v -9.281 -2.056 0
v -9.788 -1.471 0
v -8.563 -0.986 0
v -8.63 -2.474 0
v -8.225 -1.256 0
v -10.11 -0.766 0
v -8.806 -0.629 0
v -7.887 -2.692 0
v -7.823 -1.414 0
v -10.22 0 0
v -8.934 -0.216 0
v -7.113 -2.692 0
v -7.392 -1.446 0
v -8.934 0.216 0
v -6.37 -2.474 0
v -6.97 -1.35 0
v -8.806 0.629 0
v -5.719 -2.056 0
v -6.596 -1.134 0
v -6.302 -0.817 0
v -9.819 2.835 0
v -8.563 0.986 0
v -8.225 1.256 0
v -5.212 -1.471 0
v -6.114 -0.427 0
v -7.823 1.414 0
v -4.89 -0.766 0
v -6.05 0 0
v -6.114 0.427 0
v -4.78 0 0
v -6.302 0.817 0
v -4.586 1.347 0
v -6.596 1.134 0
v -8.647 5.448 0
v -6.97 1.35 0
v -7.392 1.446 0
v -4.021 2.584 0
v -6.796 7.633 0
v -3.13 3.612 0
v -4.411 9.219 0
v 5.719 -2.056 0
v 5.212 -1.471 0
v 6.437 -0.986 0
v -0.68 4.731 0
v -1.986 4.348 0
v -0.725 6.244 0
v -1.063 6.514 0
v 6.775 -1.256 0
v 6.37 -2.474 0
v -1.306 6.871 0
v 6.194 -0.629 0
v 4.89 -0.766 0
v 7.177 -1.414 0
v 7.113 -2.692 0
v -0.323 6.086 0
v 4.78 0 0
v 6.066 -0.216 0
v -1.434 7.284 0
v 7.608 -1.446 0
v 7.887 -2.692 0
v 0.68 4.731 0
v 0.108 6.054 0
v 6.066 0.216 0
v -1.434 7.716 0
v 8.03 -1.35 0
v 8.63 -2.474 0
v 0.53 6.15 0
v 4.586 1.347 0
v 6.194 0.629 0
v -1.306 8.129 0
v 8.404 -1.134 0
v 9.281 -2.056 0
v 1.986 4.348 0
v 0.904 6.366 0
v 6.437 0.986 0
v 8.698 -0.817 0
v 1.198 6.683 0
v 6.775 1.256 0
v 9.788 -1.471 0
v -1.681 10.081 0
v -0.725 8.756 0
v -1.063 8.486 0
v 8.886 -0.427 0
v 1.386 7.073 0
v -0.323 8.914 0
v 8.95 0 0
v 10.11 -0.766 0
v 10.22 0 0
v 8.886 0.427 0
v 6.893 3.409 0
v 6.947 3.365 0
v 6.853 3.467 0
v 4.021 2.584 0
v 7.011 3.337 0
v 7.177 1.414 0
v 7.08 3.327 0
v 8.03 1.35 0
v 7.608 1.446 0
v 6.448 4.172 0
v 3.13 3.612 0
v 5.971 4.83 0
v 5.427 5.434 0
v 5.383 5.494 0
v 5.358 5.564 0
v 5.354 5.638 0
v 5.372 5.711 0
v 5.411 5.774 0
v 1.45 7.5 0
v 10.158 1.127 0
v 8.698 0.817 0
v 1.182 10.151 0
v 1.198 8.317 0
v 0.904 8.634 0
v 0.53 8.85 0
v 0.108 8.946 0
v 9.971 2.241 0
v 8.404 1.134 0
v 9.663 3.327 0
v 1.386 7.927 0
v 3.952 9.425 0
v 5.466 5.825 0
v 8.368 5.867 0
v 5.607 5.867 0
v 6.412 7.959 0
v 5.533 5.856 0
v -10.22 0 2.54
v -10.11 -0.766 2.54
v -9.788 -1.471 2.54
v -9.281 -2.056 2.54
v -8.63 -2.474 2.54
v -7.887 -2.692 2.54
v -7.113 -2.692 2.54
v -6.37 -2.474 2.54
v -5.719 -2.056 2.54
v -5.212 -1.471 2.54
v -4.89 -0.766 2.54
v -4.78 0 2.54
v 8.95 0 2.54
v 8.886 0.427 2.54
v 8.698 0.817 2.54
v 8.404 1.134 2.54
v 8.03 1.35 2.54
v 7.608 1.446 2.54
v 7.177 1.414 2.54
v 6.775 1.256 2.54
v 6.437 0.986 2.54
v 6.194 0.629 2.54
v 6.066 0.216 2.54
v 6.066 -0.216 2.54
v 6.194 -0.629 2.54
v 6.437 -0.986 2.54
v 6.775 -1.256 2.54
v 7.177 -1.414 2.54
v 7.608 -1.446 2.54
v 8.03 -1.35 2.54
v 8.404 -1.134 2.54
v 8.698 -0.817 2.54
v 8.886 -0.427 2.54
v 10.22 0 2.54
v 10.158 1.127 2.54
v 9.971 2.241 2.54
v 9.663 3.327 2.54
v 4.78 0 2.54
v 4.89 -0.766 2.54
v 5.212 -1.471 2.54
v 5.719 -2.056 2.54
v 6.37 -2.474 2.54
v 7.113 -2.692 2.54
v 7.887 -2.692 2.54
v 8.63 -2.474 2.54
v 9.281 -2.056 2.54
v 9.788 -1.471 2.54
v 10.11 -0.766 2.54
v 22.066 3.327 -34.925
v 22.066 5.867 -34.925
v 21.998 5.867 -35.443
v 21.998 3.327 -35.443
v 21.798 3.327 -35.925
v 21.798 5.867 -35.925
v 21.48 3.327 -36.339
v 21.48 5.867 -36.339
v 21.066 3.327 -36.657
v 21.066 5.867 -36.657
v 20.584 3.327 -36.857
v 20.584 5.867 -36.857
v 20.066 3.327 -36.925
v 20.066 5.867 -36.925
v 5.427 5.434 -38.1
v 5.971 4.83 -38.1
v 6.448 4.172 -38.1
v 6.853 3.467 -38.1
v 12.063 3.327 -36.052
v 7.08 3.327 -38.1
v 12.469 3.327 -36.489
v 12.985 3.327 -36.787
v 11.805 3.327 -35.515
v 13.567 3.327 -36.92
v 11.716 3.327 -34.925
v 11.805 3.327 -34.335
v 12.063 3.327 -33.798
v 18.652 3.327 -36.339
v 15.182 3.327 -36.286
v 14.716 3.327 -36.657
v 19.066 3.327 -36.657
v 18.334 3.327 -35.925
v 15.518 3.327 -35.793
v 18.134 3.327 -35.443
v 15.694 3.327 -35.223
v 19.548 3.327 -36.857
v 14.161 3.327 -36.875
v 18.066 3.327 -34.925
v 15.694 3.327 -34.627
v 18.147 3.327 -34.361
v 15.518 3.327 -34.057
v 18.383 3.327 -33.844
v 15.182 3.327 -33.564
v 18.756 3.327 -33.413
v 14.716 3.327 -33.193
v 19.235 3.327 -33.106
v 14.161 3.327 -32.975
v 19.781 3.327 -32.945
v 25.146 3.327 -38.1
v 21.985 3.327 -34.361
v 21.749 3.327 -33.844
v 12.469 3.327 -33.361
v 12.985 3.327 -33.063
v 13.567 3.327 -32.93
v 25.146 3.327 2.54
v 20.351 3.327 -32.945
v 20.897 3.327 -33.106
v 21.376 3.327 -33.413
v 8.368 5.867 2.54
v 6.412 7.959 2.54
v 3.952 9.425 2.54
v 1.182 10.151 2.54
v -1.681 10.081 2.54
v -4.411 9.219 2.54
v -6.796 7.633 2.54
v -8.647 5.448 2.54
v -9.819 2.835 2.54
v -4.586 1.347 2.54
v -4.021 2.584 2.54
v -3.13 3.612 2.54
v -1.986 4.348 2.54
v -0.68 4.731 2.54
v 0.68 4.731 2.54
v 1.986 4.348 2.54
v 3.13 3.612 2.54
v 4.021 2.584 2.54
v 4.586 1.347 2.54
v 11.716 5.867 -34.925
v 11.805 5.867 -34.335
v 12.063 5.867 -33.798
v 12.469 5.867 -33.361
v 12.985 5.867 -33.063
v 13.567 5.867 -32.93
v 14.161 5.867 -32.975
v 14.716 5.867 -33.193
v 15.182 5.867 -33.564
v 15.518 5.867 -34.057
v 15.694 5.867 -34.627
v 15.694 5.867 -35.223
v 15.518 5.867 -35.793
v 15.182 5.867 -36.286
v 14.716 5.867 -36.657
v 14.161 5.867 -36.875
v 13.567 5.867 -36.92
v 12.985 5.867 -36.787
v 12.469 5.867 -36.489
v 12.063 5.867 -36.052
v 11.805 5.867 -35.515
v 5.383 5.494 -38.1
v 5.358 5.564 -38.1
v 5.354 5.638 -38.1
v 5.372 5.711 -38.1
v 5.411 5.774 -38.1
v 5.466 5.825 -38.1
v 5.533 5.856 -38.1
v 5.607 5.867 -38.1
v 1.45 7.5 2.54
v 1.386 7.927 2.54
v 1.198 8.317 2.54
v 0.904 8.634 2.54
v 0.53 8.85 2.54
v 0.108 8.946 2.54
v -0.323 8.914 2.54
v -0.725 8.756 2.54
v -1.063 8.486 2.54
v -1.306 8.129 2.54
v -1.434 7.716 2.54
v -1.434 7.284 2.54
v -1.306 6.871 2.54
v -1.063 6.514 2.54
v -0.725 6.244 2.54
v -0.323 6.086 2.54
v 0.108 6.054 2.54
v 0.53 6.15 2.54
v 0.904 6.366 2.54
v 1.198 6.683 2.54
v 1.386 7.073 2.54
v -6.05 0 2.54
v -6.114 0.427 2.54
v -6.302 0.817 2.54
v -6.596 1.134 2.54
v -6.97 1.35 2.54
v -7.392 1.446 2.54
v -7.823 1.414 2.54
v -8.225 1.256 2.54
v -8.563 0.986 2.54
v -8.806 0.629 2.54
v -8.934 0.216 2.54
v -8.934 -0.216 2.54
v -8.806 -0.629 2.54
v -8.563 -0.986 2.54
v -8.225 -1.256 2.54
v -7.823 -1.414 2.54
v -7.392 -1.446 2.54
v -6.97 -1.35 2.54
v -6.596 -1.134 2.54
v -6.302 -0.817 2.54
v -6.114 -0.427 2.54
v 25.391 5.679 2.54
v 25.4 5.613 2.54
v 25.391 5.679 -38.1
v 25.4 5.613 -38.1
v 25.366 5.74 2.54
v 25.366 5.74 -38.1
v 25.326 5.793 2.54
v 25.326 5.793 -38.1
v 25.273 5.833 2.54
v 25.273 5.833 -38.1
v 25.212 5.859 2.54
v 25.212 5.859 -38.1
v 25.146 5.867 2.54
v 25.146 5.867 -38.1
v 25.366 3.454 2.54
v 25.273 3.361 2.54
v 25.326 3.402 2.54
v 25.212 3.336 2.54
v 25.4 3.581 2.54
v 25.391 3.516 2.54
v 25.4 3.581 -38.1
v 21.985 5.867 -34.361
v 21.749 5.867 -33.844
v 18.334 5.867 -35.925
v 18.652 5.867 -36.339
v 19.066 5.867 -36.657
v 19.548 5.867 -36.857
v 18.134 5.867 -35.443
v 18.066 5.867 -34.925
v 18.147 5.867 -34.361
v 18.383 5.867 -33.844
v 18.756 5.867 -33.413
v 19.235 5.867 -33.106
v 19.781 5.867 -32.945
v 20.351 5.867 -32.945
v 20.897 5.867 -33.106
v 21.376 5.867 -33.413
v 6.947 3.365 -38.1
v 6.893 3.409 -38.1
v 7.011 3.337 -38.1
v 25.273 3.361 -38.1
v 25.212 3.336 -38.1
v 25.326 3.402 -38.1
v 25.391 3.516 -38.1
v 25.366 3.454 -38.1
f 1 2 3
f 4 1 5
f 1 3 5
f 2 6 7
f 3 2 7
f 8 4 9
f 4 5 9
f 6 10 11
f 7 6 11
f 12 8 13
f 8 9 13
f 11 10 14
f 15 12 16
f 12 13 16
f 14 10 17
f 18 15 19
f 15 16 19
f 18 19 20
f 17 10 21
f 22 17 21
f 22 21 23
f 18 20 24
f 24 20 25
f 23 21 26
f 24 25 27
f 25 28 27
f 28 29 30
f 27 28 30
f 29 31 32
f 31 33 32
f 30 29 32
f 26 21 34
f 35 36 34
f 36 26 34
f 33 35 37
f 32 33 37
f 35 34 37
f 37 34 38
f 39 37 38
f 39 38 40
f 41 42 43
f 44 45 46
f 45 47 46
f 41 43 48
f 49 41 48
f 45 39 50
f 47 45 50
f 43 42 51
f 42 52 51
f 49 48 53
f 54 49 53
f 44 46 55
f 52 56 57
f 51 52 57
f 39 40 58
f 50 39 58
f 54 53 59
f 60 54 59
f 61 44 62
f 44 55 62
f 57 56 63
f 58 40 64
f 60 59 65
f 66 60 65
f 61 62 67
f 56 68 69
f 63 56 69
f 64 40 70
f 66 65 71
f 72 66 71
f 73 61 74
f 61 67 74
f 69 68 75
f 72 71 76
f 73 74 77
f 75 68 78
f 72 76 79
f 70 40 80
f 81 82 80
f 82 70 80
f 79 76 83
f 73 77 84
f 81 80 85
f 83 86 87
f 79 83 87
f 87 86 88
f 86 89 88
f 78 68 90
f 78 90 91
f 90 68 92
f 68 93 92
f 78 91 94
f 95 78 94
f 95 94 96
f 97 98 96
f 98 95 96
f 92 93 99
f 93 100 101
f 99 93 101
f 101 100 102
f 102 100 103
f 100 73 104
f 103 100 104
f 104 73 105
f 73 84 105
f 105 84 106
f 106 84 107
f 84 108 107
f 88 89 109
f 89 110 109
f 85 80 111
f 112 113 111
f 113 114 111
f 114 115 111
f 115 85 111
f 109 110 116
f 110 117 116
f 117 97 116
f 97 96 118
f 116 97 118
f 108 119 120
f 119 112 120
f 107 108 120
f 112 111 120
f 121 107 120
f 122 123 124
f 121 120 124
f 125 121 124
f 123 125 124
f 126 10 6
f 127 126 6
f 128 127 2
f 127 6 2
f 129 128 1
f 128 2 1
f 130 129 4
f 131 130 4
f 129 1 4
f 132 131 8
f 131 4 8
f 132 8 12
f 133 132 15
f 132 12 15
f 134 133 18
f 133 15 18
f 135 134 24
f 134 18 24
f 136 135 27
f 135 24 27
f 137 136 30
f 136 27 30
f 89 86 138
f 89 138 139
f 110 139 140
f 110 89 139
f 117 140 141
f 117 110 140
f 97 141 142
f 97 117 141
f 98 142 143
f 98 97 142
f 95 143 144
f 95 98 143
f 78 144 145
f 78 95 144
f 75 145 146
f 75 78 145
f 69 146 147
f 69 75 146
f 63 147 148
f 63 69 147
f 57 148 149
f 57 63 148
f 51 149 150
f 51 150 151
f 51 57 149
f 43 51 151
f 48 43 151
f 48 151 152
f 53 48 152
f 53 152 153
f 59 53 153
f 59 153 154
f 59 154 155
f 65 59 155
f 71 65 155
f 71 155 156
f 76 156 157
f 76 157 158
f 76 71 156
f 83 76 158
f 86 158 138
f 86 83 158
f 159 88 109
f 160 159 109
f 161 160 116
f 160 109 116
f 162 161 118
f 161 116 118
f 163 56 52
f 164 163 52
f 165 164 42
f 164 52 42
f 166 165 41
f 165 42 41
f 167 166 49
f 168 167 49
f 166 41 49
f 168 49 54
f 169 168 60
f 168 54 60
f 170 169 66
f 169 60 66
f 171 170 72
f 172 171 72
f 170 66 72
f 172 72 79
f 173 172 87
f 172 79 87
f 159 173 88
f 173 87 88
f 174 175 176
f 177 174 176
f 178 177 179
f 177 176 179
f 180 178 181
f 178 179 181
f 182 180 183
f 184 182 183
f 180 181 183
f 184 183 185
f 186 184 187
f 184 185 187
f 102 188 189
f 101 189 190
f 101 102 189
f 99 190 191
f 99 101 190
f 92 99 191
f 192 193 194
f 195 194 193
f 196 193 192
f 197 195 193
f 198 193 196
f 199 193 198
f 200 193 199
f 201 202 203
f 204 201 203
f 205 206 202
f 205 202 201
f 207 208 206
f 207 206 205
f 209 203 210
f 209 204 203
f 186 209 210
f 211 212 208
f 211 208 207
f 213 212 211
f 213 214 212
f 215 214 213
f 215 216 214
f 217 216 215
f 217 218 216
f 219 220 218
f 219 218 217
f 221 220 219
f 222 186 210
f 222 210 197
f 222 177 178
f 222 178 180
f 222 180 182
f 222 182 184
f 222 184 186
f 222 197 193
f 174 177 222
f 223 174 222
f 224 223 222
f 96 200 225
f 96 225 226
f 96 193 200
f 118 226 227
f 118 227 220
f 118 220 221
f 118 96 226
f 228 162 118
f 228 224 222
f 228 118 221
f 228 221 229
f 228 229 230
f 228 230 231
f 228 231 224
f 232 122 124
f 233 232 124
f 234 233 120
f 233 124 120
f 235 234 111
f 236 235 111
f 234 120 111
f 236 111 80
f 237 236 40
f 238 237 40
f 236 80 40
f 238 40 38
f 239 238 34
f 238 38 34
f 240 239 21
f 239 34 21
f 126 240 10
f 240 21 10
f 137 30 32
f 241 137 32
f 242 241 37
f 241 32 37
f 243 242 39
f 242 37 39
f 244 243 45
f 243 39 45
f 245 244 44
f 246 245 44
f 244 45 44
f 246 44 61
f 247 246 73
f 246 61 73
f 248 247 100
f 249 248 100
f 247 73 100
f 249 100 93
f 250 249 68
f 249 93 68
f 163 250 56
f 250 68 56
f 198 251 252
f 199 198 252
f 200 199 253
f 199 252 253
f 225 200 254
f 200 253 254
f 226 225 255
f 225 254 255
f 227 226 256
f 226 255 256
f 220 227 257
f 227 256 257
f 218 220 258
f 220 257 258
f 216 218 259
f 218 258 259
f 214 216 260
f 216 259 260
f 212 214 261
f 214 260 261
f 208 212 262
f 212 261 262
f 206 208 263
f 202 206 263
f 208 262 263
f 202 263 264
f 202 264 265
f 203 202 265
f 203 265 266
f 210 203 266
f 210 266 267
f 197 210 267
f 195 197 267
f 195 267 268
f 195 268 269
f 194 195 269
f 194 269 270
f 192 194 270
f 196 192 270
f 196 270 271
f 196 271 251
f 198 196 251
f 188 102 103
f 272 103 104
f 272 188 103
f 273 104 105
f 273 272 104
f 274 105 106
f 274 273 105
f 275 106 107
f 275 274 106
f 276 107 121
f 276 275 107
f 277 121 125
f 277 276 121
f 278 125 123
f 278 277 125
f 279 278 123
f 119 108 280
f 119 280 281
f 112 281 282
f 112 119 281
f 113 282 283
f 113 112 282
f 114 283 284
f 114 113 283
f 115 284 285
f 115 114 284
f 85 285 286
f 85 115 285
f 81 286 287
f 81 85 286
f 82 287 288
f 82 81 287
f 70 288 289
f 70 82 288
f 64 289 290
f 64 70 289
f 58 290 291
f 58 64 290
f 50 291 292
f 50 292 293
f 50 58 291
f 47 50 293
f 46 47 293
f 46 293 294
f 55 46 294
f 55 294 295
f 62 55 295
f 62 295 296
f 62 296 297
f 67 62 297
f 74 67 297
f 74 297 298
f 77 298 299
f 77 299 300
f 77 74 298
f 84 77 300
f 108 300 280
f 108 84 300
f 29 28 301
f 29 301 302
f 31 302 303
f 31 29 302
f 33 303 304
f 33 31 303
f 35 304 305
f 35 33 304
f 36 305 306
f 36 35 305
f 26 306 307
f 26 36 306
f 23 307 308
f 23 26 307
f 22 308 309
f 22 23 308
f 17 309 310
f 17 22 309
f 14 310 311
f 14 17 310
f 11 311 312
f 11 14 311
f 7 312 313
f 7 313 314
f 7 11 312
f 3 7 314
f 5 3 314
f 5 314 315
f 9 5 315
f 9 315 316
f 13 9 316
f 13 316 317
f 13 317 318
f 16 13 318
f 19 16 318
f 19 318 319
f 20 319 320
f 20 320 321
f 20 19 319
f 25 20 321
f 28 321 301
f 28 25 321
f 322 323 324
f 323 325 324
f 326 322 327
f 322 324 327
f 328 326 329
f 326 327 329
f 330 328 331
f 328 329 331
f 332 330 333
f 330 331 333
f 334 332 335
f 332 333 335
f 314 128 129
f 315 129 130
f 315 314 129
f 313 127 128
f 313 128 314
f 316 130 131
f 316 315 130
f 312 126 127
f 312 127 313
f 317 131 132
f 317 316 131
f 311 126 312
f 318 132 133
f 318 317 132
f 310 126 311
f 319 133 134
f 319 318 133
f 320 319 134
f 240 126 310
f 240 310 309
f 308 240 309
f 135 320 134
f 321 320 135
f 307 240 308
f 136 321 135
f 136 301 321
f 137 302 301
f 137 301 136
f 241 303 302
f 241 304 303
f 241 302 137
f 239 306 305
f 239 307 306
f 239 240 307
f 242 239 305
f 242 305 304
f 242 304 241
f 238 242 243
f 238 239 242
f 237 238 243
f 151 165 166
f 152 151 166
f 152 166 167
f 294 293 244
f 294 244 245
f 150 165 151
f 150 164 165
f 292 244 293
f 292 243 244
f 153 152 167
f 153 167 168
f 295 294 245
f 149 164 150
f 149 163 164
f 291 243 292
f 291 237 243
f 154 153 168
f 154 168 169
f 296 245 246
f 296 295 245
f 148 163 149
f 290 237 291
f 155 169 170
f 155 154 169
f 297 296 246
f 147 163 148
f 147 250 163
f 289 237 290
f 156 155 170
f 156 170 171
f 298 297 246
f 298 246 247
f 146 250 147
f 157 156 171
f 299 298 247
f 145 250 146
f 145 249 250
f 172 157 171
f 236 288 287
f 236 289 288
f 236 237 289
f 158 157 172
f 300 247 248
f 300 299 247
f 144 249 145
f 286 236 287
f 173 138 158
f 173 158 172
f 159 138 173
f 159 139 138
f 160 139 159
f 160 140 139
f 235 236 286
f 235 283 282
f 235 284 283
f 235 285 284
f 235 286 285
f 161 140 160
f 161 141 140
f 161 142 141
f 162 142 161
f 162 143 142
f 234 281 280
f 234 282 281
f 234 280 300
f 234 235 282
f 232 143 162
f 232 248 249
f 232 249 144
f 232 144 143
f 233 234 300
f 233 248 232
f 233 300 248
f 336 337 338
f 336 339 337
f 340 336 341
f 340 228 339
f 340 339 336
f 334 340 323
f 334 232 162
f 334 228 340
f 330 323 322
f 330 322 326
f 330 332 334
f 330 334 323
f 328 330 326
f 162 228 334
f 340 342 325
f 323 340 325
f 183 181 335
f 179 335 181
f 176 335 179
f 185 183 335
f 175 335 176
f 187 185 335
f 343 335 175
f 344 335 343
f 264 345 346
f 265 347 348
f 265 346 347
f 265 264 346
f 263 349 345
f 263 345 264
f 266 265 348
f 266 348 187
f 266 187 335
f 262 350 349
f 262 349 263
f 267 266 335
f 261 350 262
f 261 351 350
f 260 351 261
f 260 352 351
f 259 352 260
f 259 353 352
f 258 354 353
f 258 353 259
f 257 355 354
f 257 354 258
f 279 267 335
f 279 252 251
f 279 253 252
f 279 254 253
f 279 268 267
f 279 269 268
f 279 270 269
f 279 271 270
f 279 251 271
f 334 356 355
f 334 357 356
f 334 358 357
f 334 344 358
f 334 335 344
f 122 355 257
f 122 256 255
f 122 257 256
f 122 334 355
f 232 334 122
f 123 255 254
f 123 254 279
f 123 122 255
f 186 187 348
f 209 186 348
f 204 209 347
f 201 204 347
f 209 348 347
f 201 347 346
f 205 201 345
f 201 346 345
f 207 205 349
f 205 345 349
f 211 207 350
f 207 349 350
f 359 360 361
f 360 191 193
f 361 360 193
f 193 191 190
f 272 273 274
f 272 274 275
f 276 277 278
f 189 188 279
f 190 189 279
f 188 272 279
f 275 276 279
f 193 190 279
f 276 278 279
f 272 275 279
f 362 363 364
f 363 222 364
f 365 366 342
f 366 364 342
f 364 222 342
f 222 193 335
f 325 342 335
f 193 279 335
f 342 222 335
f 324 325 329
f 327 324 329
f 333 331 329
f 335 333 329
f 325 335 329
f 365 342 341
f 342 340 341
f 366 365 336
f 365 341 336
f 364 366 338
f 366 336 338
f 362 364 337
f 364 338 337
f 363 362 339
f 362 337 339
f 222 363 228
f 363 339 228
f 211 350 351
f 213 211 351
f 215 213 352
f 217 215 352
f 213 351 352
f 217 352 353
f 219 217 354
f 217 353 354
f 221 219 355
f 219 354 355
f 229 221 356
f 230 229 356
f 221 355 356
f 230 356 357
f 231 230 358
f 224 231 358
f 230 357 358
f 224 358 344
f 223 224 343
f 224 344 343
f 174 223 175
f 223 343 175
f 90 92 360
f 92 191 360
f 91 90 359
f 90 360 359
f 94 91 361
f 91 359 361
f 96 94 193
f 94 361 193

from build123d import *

# Parameters (mm, degrees)
SKETCH1_R           = 1.45
BOSS_EXTRUDE1_DEPTH = 2.54
BOSS_EXTRUDE2_DEPTH = 38.1
FILLET1_R           = 0.254
CUT_EXTRUDE1_DEPTH  = 19.05


with BuildPart() as part:
    # Sketch1 → Boss-Extrude1 (new body)
    with BuildSketch(Plane.XY):
        with BuildLine():
            ThreePointArc((10.22, 0), (10.07983069, 1.686835278), (9.663167661, 3.3274))
            Line((9.663167661, 3.3274), (25.4, 3.3274))
            Line((25.4, 3.3274), (25.4, 5.8674))
            Line((25.4, 5.8674), (8.367915944, 5.8674))
            ThreePointArc((8.367915944, 5.8674), (-3.076385784, 9.745986379), (-10.22, 1.2e-08))
            ThreePointArc((-10.22, 1.2e-08), (-7.500000006, -2.72), (-4.78, 0))
            ThreePointArc((-4.78, 0), (0, 4.78), (4.78, 0))
            ThreePointArc((4.78, 0), (7.5, -2.72), (10.22, 0))
        make_face()
        with Locations((7.5, 0)):
            Circle(SKETCH1_R, mode=Mode.SUBTRACT)
        with Locations((-7.5, 0)):
            Circle(SKETCH1_R, mode=Mode.SUBTRACT)
        with Locations((0, 7.5)):
            Circle(SKETCH1_R, mode=Mode.SUBTRACT)
    extrude(amount=BOSS_EXTRUDE1_DEPTH)

    # Sketch1<3> → Boss-Extrude2 (add)
    with BuildSketch(Plane.XY):
        with BuildLine():
            ThreePointArc((4.955402833, 5.8674), (6.072863387, 4.70135409), (6.921763449, 3.3274))
            Line((6.921763449, 3.3274), (25.4, 3.3274))
            Line((25.4, 3.3274), (25.4, 5.8674))
            Line((25.4, 5.8674), (4.955402833, 5.8674))
        make_face()
    extrude(amount=-BOSS_EXTRUDE2_DEPTH)

    # Fillet1
    fillet1_edges = [part.edges().sort_by_distance(p)[0] for p in [
        (25.4, 5.8674, -17.78),
        (25.4, 3.3274, -17.78),
        (4.955402833, 5.8674, -19.05),
        (6.921763449, 3.3274, -19.05),
    ]]
    fillet(fillet1_edges, radius=FILLET1_R)

    # Sketch5 → Cut-Extrude1 (cut)
    with BuildSketch(Plane(origin=(0, 5.8674, 0), x_dir=(1, 0, 0), z_dir=(0, 1, 0))):
        with BuildLine():
            Line((22.06625, 34.925), (20.066, 34.925))
            Line((20.066, 34.925), (18.06575, 34.925))
            ThreePointArc((18.06575, 34.925), (20.066, 32.92475), (22.06625, 34.925))
        make_face()
        with BuildLine():
            ThreePointArc((22.06625, 34.925), (21.480390339, 36.339390339), (20.066, 36.92525))
            Line((20.066, 36.92525), (20.066, 34.925))
            Line((20.066, 34.925), (22.06625, 34.925))
        make_face()
        with BuildLine():
            Line((20.066, 34.925), (20.066, 36.92525))
            ThreePointArc((20.066, 36.92525), (18.651609661, 36.339390339), (18.06575, 34.925))
            Line((18.06575, 34.925), (20.066, 34.925))
        make_face()
        with BuildLine():
            ThreePointArc((15.71625, 34.925), (13.716, 36.92525), (11.71575, 34.925))
            Line((11.71575, 34.925), (15.71625, 34.925))
        make_face()
        with BuildLine():
            Line((15.71625, 34.925), (11.71575, 34.925))
            ThreePointArc((11.71575, 34.925), (13.716, 32.92475), (15.71625, 34.925))
        make_face()
    extrude(amount=-CUT_EXTRUDE1_DEPTH, mode=Mode.SUBTRACT)


solid = part.part
